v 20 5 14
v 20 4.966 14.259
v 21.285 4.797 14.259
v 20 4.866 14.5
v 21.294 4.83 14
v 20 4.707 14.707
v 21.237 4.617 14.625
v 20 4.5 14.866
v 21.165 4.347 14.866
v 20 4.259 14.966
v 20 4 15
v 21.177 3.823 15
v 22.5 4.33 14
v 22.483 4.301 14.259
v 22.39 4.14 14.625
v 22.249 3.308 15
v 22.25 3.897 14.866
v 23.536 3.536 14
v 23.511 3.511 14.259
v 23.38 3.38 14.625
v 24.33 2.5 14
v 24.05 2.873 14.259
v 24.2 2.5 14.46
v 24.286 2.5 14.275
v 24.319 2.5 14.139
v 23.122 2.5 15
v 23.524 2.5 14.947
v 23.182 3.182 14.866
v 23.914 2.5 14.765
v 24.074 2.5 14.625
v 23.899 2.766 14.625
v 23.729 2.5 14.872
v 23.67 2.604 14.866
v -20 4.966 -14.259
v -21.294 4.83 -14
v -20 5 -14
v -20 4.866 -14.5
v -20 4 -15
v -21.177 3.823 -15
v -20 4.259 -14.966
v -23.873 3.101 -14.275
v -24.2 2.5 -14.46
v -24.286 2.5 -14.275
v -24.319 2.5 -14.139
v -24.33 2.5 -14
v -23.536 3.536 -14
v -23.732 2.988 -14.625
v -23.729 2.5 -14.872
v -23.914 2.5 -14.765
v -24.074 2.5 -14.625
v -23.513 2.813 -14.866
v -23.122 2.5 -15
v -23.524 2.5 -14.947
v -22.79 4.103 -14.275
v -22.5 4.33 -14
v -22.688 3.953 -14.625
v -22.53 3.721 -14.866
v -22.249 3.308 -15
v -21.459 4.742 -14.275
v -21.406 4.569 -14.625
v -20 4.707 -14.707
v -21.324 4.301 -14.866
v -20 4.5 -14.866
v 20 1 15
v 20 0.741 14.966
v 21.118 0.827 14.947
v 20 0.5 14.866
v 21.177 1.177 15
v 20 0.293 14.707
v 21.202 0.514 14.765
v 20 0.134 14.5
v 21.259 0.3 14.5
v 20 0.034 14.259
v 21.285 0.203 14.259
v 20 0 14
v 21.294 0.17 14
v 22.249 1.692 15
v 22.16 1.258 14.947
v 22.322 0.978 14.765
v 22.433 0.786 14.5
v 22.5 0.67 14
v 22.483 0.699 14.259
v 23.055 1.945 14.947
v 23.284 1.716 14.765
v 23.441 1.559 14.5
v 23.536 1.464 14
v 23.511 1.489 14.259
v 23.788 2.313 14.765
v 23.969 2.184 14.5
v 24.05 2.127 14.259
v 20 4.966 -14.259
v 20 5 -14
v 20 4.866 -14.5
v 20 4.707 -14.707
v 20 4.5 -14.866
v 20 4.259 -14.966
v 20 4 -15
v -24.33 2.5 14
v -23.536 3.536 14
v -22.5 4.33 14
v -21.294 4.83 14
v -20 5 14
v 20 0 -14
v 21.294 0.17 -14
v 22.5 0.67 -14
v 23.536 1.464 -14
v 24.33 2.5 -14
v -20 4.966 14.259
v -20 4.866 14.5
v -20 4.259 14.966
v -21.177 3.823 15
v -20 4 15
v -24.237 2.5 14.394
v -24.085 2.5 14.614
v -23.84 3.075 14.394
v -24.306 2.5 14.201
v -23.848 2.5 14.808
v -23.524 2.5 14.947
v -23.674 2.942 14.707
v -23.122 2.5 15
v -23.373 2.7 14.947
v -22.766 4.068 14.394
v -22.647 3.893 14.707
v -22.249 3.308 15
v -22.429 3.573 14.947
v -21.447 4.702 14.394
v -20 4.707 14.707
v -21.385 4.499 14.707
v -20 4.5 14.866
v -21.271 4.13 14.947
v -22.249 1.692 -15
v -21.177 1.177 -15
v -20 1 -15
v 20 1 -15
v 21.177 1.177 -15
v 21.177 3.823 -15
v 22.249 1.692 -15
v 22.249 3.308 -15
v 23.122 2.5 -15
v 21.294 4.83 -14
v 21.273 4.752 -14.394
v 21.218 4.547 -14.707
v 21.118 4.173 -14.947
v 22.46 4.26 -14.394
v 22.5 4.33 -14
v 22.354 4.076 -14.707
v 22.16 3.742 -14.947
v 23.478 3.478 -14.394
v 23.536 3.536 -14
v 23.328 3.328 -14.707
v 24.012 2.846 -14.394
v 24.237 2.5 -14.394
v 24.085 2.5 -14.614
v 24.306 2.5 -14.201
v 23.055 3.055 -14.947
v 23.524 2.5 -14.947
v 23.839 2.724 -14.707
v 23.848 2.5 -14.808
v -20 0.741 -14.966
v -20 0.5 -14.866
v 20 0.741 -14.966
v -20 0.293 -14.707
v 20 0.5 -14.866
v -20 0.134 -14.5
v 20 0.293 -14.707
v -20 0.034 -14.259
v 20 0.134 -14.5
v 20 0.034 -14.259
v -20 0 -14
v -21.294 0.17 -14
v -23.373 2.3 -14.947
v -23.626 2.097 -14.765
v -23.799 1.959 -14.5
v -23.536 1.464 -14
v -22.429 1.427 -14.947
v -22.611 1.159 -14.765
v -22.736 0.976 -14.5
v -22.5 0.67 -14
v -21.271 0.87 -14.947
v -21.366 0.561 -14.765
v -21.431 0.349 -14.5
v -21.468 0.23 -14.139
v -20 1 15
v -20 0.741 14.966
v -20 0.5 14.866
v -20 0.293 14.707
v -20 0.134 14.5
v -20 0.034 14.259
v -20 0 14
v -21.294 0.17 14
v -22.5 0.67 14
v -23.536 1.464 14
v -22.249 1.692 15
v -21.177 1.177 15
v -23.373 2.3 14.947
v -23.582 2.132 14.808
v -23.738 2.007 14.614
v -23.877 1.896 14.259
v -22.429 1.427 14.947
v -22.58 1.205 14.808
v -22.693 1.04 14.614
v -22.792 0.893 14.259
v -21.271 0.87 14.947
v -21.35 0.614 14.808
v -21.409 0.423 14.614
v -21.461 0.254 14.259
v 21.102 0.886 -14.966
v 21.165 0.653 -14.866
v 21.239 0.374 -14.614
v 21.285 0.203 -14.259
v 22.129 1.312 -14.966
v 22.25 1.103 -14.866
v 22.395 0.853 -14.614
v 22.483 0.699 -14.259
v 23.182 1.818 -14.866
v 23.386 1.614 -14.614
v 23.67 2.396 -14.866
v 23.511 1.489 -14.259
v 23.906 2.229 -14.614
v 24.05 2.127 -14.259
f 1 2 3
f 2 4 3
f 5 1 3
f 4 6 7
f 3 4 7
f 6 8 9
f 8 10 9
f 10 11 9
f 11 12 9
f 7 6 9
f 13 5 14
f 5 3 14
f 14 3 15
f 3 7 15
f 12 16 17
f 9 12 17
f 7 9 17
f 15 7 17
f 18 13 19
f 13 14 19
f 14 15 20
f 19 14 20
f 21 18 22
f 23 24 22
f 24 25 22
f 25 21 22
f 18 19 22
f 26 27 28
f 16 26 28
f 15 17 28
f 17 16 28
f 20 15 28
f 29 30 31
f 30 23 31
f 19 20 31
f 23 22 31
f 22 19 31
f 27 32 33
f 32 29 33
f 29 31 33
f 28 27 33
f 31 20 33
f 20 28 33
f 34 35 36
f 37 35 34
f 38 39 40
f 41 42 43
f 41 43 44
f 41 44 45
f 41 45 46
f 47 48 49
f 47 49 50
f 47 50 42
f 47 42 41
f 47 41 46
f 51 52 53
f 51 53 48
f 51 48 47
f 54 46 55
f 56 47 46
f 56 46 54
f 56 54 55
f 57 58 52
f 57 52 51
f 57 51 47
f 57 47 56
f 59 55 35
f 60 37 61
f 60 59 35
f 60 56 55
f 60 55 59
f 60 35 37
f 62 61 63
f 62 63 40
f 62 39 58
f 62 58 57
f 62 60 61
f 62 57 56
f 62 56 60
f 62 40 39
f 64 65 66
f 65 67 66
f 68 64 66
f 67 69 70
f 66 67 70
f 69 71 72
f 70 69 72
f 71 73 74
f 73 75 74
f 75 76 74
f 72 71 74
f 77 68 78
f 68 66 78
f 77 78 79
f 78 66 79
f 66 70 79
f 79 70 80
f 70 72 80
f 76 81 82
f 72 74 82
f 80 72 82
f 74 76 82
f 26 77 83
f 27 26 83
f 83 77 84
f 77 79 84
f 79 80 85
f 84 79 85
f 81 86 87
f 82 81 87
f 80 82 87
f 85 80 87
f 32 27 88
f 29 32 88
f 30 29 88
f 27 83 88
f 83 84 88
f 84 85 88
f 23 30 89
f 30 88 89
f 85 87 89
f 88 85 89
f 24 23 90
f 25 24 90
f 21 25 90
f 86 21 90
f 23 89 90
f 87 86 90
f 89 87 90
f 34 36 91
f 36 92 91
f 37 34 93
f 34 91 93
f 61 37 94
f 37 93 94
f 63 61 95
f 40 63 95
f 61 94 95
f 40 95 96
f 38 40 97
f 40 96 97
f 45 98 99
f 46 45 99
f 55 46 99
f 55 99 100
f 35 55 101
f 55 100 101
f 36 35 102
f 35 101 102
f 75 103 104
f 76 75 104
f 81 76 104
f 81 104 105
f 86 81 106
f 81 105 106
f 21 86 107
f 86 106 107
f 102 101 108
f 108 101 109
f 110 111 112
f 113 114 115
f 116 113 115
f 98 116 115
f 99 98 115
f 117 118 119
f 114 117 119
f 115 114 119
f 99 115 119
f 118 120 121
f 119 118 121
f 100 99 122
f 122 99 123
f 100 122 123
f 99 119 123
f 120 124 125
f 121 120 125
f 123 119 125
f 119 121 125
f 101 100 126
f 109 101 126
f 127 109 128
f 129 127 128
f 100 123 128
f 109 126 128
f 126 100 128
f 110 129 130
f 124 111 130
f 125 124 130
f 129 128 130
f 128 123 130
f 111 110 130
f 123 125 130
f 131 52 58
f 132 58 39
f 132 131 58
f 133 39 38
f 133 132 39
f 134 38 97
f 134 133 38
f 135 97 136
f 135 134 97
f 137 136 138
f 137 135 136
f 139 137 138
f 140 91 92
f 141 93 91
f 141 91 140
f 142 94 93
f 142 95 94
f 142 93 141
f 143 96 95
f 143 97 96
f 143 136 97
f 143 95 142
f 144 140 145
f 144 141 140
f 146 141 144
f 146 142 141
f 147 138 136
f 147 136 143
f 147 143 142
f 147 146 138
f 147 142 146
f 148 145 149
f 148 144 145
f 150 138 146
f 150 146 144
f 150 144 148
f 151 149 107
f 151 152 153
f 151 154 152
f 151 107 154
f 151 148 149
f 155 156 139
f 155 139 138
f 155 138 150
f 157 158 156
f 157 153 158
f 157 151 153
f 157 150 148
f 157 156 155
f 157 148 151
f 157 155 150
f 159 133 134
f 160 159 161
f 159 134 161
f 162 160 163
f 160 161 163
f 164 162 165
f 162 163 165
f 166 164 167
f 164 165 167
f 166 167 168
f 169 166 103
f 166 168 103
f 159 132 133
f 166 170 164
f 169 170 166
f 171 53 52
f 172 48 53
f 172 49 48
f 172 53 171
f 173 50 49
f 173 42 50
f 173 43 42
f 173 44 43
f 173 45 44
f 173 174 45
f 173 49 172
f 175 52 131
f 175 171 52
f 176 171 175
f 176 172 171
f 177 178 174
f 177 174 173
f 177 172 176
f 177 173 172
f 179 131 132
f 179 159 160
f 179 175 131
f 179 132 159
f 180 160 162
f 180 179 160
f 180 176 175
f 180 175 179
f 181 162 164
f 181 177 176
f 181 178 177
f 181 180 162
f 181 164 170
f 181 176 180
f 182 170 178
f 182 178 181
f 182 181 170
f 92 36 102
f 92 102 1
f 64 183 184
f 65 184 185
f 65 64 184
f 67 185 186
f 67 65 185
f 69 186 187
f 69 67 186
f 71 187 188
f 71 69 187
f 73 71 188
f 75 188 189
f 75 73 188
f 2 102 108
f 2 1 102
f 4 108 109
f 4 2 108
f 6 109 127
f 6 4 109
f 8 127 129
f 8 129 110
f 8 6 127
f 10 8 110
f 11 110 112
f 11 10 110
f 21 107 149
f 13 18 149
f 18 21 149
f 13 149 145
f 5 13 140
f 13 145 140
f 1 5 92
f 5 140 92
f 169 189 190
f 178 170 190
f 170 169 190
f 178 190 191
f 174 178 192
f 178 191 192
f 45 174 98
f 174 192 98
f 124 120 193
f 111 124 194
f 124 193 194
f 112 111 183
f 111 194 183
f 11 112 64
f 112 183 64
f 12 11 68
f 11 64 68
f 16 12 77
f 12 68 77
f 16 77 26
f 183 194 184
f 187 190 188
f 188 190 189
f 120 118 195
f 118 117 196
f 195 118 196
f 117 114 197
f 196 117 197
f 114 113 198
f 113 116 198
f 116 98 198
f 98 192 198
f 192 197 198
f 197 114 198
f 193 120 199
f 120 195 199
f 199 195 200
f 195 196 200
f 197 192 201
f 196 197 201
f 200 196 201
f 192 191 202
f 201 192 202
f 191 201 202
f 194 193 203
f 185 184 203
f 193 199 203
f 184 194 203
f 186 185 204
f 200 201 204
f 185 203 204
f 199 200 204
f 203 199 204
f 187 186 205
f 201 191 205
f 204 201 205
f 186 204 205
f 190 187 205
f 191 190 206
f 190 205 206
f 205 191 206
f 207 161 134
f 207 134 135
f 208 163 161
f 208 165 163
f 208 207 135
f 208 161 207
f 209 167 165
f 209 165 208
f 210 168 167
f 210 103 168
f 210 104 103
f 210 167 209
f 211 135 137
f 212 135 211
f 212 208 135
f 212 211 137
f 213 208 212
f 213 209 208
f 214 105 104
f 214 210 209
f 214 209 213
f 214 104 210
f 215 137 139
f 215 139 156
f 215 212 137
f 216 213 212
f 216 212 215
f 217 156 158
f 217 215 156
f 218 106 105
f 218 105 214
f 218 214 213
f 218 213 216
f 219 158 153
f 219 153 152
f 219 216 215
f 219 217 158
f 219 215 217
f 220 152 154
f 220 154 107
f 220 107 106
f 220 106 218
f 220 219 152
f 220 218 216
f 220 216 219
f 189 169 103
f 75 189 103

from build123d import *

# Parameters (mm, degrees)
SKETCH1_W           = 50
SKETCH1_H           = 30
BOSS_EXTRUDE1_DEPTH = 5
FILLET1_R           = 5
FILLET2_R           = 1


with BuildPart() as part:
    # Sketch1 → Boss-Extrude1 (new body)
    with BuildSketch(Plane(origin=(0, 0, 0), x_dir=(1, 0, 0), z_dir=(0, 1, 0))):
        Rectangle(SKETCH1_W, SKETCH1_H)
    extrude(amount=BOSS_EXTRUDE1_DEPTH)

    # Fillet1
    # the kernel refuses this fillet: 5 mm, written as the material it takes off along each edge
    with BuildSketch(Plane(origin=(-25, 0, 27.5), x_dir=(0, 1, 0), z_dir=(0, 0, -1)), Plane(origin=(25, 0, -27.5), x_dir=(0, 1, 0), z_dir=(0, 0, 1))) as fillet1_piece_1:
        with BuildLine():
            CenterArc((FILLET1_R, FILLET1_R), FILLET1_R, 180, 90)
            Line((0, FILLET1_R), (0, 0))
            Line((0, 0), (FILLET1_R, 0))
        make_face()
    extrude(amount=55, mode=Mode.SUBTRACT)
    with BuildSketch(Plane(origin=(-25, 5, 27.5), x_dir=(0, -1, 0), z_dir=(0, 0, -1)), Plane(origin=(25, 5, -27.5), x_dir=(0, -1, 0), z_dir=(0, 0, 1))) as fillet1_piece_2:
        with BuildLine():
            CenterArc((FILLET1_R, -FILLET1_R), FILLET1_R, 90, 90)
            Line((0, -FILLET1_R), (0, 0))
            Line((0, 0), (FILLET1_R, 0))
        make_face()
    extrude(amount=55, mode=Mode.SUBTRACT)

    # Fillet2
    fillet2_edges = [part.edges().sort_by_distance(p)[0] for p in [
        (0, 0, 15),
        (0, 5, 15),
        (22.5, 4.330127019, 15),
        (22.5, 0.669872981, 15),
        (-22.5, 4.330127019, 15),
        (-22.5, 0.669872981, 15),
        (0, 0, -15),
        (0, 5, -15),
        (22.5, 4.330127019, -15),
        (22.5, 0.669872981, -15),
        (-22.5, 4.330127019, -15),
        (-22.5, 0.669872981, -15),
    ]]
    fillet(fillet2_edges, radius=FILLET2_R)


solid = part.part
